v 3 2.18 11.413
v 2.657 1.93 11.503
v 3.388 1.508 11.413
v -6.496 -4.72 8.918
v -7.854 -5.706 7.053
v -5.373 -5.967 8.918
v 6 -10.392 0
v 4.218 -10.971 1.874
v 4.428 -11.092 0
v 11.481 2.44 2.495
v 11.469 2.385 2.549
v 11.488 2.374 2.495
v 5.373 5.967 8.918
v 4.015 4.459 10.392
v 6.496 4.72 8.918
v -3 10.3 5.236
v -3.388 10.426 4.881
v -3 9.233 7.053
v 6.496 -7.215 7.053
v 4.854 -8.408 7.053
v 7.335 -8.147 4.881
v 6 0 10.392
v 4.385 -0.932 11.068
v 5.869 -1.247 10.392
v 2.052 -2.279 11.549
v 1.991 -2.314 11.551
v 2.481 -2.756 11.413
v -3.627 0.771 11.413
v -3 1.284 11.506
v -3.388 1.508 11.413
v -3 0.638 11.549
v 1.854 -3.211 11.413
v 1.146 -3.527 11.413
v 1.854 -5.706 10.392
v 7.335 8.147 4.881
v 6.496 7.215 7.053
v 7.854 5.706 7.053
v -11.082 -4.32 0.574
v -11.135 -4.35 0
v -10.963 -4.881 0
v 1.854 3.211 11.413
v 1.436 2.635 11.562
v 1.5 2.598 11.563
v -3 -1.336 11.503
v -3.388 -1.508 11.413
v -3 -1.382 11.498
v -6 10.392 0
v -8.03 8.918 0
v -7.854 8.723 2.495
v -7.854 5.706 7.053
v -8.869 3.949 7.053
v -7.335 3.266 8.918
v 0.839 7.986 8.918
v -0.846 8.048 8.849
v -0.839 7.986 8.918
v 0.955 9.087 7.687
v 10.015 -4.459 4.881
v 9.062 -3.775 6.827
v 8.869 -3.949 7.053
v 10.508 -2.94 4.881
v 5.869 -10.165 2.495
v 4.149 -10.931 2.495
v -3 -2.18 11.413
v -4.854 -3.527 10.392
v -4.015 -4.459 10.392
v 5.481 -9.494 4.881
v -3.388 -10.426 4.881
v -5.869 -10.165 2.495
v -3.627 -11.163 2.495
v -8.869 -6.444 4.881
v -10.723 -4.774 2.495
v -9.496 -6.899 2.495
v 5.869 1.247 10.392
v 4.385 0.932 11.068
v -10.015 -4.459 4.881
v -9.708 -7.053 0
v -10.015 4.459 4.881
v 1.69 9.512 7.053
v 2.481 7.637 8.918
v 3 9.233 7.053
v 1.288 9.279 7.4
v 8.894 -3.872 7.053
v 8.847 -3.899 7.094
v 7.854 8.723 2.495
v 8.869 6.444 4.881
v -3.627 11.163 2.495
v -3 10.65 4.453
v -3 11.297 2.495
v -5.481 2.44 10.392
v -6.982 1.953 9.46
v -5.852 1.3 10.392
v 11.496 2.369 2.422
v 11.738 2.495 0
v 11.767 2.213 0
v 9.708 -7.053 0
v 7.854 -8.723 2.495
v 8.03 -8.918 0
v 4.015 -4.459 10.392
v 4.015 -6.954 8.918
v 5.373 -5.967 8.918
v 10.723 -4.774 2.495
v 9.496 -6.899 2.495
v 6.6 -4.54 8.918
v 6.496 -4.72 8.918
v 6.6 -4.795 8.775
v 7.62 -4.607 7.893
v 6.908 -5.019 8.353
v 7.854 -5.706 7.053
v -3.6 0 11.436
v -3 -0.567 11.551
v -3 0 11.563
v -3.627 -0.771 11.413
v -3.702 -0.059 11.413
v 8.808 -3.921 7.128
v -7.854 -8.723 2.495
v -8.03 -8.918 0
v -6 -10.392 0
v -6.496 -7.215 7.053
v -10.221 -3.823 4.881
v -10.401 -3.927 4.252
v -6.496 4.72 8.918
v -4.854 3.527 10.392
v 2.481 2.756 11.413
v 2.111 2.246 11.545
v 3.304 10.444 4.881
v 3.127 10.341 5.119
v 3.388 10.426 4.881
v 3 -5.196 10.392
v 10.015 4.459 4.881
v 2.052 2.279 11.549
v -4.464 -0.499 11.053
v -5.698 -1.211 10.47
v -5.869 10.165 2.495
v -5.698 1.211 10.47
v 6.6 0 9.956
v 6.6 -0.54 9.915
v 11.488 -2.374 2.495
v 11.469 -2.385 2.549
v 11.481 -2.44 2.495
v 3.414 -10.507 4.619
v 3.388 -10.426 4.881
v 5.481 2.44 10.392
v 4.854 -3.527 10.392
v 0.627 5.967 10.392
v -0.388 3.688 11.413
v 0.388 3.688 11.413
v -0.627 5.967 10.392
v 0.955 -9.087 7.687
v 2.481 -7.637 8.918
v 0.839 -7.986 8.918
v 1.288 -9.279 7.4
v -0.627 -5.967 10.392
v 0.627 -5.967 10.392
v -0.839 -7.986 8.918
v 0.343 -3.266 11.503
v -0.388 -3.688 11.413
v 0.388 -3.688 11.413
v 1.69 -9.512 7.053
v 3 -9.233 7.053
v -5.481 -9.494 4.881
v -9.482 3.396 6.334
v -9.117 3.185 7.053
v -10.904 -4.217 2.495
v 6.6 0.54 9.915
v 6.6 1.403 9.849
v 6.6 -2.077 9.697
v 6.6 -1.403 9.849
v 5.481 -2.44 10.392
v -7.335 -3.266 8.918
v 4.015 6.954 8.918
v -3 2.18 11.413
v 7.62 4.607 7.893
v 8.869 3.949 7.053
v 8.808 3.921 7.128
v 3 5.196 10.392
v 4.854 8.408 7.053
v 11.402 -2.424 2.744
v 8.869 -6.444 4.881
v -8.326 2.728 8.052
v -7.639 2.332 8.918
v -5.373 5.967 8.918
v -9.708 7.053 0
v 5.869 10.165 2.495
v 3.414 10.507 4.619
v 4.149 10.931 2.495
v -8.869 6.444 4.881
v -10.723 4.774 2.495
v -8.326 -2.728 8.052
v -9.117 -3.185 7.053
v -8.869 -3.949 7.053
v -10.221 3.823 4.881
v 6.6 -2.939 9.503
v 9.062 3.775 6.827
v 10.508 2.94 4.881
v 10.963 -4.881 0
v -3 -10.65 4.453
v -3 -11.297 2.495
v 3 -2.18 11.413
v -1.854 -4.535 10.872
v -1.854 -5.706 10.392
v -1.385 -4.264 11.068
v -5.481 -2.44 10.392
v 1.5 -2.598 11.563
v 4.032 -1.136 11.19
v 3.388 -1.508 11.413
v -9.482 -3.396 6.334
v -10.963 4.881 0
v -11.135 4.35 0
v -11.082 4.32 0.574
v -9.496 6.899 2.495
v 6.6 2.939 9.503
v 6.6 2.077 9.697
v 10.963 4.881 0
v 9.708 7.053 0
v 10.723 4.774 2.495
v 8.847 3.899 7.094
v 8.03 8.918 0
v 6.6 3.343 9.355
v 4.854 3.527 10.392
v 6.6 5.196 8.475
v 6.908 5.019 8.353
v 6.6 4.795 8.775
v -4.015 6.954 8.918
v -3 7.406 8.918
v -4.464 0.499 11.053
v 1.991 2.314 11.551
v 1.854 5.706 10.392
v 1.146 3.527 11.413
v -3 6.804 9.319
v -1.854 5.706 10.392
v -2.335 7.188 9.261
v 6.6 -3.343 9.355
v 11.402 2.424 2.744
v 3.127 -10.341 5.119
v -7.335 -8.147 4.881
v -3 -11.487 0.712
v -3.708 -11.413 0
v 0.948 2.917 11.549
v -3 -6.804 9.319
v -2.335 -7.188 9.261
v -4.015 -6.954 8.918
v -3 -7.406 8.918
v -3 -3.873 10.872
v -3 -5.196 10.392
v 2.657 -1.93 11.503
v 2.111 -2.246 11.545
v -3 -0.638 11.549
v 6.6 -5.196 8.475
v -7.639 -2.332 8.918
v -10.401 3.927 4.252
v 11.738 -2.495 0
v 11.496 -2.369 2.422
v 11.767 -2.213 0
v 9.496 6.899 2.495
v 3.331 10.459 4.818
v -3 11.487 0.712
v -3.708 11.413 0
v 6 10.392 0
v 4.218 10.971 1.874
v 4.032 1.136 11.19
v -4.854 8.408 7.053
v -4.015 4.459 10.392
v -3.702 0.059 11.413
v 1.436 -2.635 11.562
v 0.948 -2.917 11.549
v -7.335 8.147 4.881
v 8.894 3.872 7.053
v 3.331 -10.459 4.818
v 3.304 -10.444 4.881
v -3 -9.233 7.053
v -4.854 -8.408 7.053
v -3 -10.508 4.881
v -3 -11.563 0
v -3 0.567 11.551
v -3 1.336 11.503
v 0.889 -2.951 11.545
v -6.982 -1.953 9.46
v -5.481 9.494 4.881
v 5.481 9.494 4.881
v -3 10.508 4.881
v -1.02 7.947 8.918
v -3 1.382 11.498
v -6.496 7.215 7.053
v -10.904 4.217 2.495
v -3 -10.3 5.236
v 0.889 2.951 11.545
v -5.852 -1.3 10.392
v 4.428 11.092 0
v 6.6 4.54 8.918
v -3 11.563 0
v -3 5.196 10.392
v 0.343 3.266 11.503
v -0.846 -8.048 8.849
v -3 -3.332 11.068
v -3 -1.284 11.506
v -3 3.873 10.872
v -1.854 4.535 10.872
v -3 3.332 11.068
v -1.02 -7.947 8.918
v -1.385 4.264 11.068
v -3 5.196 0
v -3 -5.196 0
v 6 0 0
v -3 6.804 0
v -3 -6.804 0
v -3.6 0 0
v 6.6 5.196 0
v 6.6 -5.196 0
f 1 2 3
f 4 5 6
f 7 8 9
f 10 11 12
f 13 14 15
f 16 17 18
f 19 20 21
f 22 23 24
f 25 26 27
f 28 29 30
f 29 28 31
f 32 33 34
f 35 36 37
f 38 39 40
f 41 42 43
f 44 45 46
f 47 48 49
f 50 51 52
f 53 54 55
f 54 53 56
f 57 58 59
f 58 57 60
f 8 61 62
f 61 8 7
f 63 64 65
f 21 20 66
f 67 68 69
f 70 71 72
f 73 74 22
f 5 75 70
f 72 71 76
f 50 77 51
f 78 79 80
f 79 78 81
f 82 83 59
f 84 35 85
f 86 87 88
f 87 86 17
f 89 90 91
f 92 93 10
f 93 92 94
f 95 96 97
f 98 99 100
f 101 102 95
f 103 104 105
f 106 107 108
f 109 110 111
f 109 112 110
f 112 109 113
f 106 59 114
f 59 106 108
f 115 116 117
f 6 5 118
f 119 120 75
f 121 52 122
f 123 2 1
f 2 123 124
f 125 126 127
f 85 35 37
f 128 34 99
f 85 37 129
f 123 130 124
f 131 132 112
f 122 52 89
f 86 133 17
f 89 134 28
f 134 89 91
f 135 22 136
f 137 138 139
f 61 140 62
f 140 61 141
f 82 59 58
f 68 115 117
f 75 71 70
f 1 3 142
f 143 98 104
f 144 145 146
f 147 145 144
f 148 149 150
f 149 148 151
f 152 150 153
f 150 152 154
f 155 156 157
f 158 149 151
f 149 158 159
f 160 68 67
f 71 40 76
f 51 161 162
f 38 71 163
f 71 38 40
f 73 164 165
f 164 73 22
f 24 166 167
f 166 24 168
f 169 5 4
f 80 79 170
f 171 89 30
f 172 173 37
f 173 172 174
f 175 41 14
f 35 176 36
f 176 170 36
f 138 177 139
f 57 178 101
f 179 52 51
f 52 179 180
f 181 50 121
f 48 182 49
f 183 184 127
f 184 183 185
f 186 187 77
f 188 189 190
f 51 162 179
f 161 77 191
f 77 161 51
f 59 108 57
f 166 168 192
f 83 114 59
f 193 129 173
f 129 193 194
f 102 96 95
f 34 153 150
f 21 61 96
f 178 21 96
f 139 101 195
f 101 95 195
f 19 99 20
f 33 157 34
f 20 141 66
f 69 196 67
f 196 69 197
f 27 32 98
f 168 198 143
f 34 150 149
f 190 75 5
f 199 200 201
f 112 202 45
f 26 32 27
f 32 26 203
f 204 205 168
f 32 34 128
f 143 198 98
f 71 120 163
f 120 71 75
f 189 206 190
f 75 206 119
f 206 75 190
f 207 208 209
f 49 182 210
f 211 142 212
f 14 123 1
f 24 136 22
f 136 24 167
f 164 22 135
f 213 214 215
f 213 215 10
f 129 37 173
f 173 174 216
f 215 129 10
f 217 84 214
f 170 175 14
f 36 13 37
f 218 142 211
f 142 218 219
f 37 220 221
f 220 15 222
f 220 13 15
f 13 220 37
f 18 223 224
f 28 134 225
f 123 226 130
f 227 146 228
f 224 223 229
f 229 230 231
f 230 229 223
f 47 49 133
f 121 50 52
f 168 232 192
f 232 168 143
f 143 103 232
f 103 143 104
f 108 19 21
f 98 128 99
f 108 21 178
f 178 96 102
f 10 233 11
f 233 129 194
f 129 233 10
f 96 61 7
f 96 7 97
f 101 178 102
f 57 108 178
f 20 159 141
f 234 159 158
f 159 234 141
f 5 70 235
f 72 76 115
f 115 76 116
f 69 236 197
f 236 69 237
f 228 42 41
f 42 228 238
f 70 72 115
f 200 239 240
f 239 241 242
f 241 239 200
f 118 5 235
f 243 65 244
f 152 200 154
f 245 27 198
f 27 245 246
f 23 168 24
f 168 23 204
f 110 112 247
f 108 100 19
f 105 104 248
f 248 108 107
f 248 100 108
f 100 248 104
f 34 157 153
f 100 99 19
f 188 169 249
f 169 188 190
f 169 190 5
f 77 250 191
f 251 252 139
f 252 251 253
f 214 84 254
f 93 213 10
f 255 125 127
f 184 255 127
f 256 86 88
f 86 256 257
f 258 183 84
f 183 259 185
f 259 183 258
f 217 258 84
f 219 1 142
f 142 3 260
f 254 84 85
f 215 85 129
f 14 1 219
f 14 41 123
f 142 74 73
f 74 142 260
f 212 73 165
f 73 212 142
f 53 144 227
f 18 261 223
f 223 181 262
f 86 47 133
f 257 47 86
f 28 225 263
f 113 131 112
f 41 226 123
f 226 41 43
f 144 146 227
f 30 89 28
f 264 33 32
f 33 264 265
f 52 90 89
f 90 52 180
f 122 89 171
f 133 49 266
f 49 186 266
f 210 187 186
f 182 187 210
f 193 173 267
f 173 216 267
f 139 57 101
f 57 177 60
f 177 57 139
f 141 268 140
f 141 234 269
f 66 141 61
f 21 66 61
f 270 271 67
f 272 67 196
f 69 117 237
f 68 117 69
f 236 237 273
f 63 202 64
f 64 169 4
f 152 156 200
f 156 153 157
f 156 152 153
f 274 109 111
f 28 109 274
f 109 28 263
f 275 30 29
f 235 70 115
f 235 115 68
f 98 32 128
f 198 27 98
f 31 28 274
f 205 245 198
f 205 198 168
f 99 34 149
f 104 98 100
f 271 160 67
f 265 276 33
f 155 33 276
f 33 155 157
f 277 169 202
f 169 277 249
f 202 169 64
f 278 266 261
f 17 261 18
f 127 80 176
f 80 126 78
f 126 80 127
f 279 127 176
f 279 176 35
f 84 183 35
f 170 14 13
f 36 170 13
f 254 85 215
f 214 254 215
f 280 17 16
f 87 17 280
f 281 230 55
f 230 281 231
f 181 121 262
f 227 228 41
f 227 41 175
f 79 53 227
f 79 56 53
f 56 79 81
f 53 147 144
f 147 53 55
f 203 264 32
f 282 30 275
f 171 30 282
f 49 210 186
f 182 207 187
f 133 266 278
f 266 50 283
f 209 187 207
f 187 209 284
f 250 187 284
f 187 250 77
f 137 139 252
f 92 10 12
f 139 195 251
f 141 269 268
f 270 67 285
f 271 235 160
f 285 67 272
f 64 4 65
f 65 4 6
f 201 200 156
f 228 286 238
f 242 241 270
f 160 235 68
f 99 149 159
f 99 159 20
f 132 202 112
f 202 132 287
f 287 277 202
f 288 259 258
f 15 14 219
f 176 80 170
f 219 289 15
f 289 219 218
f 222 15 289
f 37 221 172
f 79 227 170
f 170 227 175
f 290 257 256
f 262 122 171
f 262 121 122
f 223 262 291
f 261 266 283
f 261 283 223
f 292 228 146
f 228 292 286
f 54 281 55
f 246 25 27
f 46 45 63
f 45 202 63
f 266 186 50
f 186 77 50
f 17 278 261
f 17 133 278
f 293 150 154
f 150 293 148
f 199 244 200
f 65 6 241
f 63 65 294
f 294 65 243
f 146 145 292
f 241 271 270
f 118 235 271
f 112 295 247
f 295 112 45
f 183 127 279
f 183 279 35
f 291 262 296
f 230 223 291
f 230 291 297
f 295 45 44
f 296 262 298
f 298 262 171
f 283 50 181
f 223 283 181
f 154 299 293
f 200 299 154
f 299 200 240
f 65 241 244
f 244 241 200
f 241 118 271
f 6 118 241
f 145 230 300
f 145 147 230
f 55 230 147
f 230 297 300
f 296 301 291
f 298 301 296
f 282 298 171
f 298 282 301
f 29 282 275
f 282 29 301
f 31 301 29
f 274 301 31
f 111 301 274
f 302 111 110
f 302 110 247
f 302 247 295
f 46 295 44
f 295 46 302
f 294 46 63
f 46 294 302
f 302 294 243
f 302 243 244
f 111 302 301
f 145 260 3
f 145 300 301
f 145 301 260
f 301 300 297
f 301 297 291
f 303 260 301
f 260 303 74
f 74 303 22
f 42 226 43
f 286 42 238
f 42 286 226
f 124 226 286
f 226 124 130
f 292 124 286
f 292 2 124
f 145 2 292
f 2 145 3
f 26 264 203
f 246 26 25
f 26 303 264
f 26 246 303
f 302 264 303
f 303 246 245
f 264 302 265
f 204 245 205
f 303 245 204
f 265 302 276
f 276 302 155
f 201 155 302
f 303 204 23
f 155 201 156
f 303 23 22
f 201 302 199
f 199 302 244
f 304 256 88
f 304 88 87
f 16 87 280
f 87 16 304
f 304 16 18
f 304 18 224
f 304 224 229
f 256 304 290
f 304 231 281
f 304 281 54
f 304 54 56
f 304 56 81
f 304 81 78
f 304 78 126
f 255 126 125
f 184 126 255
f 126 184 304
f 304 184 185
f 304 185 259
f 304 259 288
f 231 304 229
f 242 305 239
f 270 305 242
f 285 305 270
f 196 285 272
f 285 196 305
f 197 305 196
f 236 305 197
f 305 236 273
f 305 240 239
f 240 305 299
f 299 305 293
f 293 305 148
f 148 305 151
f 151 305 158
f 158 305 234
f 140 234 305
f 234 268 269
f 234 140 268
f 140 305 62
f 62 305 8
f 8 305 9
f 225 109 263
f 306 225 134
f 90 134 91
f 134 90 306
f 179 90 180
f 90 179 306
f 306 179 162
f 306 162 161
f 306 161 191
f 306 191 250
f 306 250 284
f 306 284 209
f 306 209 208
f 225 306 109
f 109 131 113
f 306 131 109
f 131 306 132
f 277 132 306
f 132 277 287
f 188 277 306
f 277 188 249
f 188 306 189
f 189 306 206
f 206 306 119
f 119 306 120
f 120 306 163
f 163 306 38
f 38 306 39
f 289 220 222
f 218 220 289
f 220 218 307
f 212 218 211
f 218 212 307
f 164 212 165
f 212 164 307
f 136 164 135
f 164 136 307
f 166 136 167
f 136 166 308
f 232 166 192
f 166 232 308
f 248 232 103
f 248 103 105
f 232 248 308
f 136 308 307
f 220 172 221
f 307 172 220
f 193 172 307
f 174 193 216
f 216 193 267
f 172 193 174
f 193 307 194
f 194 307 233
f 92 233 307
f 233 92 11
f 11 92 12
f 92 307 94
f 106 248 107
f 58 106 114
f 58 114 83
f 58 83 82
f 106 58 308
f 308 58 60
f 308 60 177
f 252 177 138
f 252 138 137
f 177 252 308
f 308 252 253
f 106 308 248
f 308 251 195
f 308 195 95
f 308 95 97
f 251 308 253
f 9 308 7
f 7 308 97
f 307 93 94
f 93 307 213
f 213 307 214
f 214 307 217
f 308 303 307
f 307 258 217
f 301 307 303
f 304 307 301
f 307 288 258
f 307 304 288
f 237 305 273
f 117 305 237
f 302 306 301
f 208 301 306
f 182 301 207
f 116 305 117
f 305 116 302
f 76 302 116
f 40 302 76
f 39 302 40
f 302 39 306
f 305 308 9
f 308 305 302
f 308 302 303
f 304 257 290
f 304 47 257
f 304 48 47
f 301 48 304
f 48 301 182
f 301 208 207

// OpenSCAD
scale(1.2,1.2,1.2){
difference(){
    sphere(r = 10);
    translate(v=[0,0,-1])
    cylinder(h=25,r=5,$fn=3, center=true);
	translate(v=[0,10,-1])
    cylinder(h=25,r=5,$fn=3, center=true);
	translate(v=[0,-10,-1])
    cylinder(h=25,r=5,$fn=3, center=true);
	translate(v=[-8,0,-1])
    cylinder(h=25,r=5,$fn=3, center=true);
	translate(v=[8,0,-1])
    cylinder(h=25,r=5,$fn=3, center=true);
translate([0,0,-5])
cube([20,20,10], center=true);
}
}
